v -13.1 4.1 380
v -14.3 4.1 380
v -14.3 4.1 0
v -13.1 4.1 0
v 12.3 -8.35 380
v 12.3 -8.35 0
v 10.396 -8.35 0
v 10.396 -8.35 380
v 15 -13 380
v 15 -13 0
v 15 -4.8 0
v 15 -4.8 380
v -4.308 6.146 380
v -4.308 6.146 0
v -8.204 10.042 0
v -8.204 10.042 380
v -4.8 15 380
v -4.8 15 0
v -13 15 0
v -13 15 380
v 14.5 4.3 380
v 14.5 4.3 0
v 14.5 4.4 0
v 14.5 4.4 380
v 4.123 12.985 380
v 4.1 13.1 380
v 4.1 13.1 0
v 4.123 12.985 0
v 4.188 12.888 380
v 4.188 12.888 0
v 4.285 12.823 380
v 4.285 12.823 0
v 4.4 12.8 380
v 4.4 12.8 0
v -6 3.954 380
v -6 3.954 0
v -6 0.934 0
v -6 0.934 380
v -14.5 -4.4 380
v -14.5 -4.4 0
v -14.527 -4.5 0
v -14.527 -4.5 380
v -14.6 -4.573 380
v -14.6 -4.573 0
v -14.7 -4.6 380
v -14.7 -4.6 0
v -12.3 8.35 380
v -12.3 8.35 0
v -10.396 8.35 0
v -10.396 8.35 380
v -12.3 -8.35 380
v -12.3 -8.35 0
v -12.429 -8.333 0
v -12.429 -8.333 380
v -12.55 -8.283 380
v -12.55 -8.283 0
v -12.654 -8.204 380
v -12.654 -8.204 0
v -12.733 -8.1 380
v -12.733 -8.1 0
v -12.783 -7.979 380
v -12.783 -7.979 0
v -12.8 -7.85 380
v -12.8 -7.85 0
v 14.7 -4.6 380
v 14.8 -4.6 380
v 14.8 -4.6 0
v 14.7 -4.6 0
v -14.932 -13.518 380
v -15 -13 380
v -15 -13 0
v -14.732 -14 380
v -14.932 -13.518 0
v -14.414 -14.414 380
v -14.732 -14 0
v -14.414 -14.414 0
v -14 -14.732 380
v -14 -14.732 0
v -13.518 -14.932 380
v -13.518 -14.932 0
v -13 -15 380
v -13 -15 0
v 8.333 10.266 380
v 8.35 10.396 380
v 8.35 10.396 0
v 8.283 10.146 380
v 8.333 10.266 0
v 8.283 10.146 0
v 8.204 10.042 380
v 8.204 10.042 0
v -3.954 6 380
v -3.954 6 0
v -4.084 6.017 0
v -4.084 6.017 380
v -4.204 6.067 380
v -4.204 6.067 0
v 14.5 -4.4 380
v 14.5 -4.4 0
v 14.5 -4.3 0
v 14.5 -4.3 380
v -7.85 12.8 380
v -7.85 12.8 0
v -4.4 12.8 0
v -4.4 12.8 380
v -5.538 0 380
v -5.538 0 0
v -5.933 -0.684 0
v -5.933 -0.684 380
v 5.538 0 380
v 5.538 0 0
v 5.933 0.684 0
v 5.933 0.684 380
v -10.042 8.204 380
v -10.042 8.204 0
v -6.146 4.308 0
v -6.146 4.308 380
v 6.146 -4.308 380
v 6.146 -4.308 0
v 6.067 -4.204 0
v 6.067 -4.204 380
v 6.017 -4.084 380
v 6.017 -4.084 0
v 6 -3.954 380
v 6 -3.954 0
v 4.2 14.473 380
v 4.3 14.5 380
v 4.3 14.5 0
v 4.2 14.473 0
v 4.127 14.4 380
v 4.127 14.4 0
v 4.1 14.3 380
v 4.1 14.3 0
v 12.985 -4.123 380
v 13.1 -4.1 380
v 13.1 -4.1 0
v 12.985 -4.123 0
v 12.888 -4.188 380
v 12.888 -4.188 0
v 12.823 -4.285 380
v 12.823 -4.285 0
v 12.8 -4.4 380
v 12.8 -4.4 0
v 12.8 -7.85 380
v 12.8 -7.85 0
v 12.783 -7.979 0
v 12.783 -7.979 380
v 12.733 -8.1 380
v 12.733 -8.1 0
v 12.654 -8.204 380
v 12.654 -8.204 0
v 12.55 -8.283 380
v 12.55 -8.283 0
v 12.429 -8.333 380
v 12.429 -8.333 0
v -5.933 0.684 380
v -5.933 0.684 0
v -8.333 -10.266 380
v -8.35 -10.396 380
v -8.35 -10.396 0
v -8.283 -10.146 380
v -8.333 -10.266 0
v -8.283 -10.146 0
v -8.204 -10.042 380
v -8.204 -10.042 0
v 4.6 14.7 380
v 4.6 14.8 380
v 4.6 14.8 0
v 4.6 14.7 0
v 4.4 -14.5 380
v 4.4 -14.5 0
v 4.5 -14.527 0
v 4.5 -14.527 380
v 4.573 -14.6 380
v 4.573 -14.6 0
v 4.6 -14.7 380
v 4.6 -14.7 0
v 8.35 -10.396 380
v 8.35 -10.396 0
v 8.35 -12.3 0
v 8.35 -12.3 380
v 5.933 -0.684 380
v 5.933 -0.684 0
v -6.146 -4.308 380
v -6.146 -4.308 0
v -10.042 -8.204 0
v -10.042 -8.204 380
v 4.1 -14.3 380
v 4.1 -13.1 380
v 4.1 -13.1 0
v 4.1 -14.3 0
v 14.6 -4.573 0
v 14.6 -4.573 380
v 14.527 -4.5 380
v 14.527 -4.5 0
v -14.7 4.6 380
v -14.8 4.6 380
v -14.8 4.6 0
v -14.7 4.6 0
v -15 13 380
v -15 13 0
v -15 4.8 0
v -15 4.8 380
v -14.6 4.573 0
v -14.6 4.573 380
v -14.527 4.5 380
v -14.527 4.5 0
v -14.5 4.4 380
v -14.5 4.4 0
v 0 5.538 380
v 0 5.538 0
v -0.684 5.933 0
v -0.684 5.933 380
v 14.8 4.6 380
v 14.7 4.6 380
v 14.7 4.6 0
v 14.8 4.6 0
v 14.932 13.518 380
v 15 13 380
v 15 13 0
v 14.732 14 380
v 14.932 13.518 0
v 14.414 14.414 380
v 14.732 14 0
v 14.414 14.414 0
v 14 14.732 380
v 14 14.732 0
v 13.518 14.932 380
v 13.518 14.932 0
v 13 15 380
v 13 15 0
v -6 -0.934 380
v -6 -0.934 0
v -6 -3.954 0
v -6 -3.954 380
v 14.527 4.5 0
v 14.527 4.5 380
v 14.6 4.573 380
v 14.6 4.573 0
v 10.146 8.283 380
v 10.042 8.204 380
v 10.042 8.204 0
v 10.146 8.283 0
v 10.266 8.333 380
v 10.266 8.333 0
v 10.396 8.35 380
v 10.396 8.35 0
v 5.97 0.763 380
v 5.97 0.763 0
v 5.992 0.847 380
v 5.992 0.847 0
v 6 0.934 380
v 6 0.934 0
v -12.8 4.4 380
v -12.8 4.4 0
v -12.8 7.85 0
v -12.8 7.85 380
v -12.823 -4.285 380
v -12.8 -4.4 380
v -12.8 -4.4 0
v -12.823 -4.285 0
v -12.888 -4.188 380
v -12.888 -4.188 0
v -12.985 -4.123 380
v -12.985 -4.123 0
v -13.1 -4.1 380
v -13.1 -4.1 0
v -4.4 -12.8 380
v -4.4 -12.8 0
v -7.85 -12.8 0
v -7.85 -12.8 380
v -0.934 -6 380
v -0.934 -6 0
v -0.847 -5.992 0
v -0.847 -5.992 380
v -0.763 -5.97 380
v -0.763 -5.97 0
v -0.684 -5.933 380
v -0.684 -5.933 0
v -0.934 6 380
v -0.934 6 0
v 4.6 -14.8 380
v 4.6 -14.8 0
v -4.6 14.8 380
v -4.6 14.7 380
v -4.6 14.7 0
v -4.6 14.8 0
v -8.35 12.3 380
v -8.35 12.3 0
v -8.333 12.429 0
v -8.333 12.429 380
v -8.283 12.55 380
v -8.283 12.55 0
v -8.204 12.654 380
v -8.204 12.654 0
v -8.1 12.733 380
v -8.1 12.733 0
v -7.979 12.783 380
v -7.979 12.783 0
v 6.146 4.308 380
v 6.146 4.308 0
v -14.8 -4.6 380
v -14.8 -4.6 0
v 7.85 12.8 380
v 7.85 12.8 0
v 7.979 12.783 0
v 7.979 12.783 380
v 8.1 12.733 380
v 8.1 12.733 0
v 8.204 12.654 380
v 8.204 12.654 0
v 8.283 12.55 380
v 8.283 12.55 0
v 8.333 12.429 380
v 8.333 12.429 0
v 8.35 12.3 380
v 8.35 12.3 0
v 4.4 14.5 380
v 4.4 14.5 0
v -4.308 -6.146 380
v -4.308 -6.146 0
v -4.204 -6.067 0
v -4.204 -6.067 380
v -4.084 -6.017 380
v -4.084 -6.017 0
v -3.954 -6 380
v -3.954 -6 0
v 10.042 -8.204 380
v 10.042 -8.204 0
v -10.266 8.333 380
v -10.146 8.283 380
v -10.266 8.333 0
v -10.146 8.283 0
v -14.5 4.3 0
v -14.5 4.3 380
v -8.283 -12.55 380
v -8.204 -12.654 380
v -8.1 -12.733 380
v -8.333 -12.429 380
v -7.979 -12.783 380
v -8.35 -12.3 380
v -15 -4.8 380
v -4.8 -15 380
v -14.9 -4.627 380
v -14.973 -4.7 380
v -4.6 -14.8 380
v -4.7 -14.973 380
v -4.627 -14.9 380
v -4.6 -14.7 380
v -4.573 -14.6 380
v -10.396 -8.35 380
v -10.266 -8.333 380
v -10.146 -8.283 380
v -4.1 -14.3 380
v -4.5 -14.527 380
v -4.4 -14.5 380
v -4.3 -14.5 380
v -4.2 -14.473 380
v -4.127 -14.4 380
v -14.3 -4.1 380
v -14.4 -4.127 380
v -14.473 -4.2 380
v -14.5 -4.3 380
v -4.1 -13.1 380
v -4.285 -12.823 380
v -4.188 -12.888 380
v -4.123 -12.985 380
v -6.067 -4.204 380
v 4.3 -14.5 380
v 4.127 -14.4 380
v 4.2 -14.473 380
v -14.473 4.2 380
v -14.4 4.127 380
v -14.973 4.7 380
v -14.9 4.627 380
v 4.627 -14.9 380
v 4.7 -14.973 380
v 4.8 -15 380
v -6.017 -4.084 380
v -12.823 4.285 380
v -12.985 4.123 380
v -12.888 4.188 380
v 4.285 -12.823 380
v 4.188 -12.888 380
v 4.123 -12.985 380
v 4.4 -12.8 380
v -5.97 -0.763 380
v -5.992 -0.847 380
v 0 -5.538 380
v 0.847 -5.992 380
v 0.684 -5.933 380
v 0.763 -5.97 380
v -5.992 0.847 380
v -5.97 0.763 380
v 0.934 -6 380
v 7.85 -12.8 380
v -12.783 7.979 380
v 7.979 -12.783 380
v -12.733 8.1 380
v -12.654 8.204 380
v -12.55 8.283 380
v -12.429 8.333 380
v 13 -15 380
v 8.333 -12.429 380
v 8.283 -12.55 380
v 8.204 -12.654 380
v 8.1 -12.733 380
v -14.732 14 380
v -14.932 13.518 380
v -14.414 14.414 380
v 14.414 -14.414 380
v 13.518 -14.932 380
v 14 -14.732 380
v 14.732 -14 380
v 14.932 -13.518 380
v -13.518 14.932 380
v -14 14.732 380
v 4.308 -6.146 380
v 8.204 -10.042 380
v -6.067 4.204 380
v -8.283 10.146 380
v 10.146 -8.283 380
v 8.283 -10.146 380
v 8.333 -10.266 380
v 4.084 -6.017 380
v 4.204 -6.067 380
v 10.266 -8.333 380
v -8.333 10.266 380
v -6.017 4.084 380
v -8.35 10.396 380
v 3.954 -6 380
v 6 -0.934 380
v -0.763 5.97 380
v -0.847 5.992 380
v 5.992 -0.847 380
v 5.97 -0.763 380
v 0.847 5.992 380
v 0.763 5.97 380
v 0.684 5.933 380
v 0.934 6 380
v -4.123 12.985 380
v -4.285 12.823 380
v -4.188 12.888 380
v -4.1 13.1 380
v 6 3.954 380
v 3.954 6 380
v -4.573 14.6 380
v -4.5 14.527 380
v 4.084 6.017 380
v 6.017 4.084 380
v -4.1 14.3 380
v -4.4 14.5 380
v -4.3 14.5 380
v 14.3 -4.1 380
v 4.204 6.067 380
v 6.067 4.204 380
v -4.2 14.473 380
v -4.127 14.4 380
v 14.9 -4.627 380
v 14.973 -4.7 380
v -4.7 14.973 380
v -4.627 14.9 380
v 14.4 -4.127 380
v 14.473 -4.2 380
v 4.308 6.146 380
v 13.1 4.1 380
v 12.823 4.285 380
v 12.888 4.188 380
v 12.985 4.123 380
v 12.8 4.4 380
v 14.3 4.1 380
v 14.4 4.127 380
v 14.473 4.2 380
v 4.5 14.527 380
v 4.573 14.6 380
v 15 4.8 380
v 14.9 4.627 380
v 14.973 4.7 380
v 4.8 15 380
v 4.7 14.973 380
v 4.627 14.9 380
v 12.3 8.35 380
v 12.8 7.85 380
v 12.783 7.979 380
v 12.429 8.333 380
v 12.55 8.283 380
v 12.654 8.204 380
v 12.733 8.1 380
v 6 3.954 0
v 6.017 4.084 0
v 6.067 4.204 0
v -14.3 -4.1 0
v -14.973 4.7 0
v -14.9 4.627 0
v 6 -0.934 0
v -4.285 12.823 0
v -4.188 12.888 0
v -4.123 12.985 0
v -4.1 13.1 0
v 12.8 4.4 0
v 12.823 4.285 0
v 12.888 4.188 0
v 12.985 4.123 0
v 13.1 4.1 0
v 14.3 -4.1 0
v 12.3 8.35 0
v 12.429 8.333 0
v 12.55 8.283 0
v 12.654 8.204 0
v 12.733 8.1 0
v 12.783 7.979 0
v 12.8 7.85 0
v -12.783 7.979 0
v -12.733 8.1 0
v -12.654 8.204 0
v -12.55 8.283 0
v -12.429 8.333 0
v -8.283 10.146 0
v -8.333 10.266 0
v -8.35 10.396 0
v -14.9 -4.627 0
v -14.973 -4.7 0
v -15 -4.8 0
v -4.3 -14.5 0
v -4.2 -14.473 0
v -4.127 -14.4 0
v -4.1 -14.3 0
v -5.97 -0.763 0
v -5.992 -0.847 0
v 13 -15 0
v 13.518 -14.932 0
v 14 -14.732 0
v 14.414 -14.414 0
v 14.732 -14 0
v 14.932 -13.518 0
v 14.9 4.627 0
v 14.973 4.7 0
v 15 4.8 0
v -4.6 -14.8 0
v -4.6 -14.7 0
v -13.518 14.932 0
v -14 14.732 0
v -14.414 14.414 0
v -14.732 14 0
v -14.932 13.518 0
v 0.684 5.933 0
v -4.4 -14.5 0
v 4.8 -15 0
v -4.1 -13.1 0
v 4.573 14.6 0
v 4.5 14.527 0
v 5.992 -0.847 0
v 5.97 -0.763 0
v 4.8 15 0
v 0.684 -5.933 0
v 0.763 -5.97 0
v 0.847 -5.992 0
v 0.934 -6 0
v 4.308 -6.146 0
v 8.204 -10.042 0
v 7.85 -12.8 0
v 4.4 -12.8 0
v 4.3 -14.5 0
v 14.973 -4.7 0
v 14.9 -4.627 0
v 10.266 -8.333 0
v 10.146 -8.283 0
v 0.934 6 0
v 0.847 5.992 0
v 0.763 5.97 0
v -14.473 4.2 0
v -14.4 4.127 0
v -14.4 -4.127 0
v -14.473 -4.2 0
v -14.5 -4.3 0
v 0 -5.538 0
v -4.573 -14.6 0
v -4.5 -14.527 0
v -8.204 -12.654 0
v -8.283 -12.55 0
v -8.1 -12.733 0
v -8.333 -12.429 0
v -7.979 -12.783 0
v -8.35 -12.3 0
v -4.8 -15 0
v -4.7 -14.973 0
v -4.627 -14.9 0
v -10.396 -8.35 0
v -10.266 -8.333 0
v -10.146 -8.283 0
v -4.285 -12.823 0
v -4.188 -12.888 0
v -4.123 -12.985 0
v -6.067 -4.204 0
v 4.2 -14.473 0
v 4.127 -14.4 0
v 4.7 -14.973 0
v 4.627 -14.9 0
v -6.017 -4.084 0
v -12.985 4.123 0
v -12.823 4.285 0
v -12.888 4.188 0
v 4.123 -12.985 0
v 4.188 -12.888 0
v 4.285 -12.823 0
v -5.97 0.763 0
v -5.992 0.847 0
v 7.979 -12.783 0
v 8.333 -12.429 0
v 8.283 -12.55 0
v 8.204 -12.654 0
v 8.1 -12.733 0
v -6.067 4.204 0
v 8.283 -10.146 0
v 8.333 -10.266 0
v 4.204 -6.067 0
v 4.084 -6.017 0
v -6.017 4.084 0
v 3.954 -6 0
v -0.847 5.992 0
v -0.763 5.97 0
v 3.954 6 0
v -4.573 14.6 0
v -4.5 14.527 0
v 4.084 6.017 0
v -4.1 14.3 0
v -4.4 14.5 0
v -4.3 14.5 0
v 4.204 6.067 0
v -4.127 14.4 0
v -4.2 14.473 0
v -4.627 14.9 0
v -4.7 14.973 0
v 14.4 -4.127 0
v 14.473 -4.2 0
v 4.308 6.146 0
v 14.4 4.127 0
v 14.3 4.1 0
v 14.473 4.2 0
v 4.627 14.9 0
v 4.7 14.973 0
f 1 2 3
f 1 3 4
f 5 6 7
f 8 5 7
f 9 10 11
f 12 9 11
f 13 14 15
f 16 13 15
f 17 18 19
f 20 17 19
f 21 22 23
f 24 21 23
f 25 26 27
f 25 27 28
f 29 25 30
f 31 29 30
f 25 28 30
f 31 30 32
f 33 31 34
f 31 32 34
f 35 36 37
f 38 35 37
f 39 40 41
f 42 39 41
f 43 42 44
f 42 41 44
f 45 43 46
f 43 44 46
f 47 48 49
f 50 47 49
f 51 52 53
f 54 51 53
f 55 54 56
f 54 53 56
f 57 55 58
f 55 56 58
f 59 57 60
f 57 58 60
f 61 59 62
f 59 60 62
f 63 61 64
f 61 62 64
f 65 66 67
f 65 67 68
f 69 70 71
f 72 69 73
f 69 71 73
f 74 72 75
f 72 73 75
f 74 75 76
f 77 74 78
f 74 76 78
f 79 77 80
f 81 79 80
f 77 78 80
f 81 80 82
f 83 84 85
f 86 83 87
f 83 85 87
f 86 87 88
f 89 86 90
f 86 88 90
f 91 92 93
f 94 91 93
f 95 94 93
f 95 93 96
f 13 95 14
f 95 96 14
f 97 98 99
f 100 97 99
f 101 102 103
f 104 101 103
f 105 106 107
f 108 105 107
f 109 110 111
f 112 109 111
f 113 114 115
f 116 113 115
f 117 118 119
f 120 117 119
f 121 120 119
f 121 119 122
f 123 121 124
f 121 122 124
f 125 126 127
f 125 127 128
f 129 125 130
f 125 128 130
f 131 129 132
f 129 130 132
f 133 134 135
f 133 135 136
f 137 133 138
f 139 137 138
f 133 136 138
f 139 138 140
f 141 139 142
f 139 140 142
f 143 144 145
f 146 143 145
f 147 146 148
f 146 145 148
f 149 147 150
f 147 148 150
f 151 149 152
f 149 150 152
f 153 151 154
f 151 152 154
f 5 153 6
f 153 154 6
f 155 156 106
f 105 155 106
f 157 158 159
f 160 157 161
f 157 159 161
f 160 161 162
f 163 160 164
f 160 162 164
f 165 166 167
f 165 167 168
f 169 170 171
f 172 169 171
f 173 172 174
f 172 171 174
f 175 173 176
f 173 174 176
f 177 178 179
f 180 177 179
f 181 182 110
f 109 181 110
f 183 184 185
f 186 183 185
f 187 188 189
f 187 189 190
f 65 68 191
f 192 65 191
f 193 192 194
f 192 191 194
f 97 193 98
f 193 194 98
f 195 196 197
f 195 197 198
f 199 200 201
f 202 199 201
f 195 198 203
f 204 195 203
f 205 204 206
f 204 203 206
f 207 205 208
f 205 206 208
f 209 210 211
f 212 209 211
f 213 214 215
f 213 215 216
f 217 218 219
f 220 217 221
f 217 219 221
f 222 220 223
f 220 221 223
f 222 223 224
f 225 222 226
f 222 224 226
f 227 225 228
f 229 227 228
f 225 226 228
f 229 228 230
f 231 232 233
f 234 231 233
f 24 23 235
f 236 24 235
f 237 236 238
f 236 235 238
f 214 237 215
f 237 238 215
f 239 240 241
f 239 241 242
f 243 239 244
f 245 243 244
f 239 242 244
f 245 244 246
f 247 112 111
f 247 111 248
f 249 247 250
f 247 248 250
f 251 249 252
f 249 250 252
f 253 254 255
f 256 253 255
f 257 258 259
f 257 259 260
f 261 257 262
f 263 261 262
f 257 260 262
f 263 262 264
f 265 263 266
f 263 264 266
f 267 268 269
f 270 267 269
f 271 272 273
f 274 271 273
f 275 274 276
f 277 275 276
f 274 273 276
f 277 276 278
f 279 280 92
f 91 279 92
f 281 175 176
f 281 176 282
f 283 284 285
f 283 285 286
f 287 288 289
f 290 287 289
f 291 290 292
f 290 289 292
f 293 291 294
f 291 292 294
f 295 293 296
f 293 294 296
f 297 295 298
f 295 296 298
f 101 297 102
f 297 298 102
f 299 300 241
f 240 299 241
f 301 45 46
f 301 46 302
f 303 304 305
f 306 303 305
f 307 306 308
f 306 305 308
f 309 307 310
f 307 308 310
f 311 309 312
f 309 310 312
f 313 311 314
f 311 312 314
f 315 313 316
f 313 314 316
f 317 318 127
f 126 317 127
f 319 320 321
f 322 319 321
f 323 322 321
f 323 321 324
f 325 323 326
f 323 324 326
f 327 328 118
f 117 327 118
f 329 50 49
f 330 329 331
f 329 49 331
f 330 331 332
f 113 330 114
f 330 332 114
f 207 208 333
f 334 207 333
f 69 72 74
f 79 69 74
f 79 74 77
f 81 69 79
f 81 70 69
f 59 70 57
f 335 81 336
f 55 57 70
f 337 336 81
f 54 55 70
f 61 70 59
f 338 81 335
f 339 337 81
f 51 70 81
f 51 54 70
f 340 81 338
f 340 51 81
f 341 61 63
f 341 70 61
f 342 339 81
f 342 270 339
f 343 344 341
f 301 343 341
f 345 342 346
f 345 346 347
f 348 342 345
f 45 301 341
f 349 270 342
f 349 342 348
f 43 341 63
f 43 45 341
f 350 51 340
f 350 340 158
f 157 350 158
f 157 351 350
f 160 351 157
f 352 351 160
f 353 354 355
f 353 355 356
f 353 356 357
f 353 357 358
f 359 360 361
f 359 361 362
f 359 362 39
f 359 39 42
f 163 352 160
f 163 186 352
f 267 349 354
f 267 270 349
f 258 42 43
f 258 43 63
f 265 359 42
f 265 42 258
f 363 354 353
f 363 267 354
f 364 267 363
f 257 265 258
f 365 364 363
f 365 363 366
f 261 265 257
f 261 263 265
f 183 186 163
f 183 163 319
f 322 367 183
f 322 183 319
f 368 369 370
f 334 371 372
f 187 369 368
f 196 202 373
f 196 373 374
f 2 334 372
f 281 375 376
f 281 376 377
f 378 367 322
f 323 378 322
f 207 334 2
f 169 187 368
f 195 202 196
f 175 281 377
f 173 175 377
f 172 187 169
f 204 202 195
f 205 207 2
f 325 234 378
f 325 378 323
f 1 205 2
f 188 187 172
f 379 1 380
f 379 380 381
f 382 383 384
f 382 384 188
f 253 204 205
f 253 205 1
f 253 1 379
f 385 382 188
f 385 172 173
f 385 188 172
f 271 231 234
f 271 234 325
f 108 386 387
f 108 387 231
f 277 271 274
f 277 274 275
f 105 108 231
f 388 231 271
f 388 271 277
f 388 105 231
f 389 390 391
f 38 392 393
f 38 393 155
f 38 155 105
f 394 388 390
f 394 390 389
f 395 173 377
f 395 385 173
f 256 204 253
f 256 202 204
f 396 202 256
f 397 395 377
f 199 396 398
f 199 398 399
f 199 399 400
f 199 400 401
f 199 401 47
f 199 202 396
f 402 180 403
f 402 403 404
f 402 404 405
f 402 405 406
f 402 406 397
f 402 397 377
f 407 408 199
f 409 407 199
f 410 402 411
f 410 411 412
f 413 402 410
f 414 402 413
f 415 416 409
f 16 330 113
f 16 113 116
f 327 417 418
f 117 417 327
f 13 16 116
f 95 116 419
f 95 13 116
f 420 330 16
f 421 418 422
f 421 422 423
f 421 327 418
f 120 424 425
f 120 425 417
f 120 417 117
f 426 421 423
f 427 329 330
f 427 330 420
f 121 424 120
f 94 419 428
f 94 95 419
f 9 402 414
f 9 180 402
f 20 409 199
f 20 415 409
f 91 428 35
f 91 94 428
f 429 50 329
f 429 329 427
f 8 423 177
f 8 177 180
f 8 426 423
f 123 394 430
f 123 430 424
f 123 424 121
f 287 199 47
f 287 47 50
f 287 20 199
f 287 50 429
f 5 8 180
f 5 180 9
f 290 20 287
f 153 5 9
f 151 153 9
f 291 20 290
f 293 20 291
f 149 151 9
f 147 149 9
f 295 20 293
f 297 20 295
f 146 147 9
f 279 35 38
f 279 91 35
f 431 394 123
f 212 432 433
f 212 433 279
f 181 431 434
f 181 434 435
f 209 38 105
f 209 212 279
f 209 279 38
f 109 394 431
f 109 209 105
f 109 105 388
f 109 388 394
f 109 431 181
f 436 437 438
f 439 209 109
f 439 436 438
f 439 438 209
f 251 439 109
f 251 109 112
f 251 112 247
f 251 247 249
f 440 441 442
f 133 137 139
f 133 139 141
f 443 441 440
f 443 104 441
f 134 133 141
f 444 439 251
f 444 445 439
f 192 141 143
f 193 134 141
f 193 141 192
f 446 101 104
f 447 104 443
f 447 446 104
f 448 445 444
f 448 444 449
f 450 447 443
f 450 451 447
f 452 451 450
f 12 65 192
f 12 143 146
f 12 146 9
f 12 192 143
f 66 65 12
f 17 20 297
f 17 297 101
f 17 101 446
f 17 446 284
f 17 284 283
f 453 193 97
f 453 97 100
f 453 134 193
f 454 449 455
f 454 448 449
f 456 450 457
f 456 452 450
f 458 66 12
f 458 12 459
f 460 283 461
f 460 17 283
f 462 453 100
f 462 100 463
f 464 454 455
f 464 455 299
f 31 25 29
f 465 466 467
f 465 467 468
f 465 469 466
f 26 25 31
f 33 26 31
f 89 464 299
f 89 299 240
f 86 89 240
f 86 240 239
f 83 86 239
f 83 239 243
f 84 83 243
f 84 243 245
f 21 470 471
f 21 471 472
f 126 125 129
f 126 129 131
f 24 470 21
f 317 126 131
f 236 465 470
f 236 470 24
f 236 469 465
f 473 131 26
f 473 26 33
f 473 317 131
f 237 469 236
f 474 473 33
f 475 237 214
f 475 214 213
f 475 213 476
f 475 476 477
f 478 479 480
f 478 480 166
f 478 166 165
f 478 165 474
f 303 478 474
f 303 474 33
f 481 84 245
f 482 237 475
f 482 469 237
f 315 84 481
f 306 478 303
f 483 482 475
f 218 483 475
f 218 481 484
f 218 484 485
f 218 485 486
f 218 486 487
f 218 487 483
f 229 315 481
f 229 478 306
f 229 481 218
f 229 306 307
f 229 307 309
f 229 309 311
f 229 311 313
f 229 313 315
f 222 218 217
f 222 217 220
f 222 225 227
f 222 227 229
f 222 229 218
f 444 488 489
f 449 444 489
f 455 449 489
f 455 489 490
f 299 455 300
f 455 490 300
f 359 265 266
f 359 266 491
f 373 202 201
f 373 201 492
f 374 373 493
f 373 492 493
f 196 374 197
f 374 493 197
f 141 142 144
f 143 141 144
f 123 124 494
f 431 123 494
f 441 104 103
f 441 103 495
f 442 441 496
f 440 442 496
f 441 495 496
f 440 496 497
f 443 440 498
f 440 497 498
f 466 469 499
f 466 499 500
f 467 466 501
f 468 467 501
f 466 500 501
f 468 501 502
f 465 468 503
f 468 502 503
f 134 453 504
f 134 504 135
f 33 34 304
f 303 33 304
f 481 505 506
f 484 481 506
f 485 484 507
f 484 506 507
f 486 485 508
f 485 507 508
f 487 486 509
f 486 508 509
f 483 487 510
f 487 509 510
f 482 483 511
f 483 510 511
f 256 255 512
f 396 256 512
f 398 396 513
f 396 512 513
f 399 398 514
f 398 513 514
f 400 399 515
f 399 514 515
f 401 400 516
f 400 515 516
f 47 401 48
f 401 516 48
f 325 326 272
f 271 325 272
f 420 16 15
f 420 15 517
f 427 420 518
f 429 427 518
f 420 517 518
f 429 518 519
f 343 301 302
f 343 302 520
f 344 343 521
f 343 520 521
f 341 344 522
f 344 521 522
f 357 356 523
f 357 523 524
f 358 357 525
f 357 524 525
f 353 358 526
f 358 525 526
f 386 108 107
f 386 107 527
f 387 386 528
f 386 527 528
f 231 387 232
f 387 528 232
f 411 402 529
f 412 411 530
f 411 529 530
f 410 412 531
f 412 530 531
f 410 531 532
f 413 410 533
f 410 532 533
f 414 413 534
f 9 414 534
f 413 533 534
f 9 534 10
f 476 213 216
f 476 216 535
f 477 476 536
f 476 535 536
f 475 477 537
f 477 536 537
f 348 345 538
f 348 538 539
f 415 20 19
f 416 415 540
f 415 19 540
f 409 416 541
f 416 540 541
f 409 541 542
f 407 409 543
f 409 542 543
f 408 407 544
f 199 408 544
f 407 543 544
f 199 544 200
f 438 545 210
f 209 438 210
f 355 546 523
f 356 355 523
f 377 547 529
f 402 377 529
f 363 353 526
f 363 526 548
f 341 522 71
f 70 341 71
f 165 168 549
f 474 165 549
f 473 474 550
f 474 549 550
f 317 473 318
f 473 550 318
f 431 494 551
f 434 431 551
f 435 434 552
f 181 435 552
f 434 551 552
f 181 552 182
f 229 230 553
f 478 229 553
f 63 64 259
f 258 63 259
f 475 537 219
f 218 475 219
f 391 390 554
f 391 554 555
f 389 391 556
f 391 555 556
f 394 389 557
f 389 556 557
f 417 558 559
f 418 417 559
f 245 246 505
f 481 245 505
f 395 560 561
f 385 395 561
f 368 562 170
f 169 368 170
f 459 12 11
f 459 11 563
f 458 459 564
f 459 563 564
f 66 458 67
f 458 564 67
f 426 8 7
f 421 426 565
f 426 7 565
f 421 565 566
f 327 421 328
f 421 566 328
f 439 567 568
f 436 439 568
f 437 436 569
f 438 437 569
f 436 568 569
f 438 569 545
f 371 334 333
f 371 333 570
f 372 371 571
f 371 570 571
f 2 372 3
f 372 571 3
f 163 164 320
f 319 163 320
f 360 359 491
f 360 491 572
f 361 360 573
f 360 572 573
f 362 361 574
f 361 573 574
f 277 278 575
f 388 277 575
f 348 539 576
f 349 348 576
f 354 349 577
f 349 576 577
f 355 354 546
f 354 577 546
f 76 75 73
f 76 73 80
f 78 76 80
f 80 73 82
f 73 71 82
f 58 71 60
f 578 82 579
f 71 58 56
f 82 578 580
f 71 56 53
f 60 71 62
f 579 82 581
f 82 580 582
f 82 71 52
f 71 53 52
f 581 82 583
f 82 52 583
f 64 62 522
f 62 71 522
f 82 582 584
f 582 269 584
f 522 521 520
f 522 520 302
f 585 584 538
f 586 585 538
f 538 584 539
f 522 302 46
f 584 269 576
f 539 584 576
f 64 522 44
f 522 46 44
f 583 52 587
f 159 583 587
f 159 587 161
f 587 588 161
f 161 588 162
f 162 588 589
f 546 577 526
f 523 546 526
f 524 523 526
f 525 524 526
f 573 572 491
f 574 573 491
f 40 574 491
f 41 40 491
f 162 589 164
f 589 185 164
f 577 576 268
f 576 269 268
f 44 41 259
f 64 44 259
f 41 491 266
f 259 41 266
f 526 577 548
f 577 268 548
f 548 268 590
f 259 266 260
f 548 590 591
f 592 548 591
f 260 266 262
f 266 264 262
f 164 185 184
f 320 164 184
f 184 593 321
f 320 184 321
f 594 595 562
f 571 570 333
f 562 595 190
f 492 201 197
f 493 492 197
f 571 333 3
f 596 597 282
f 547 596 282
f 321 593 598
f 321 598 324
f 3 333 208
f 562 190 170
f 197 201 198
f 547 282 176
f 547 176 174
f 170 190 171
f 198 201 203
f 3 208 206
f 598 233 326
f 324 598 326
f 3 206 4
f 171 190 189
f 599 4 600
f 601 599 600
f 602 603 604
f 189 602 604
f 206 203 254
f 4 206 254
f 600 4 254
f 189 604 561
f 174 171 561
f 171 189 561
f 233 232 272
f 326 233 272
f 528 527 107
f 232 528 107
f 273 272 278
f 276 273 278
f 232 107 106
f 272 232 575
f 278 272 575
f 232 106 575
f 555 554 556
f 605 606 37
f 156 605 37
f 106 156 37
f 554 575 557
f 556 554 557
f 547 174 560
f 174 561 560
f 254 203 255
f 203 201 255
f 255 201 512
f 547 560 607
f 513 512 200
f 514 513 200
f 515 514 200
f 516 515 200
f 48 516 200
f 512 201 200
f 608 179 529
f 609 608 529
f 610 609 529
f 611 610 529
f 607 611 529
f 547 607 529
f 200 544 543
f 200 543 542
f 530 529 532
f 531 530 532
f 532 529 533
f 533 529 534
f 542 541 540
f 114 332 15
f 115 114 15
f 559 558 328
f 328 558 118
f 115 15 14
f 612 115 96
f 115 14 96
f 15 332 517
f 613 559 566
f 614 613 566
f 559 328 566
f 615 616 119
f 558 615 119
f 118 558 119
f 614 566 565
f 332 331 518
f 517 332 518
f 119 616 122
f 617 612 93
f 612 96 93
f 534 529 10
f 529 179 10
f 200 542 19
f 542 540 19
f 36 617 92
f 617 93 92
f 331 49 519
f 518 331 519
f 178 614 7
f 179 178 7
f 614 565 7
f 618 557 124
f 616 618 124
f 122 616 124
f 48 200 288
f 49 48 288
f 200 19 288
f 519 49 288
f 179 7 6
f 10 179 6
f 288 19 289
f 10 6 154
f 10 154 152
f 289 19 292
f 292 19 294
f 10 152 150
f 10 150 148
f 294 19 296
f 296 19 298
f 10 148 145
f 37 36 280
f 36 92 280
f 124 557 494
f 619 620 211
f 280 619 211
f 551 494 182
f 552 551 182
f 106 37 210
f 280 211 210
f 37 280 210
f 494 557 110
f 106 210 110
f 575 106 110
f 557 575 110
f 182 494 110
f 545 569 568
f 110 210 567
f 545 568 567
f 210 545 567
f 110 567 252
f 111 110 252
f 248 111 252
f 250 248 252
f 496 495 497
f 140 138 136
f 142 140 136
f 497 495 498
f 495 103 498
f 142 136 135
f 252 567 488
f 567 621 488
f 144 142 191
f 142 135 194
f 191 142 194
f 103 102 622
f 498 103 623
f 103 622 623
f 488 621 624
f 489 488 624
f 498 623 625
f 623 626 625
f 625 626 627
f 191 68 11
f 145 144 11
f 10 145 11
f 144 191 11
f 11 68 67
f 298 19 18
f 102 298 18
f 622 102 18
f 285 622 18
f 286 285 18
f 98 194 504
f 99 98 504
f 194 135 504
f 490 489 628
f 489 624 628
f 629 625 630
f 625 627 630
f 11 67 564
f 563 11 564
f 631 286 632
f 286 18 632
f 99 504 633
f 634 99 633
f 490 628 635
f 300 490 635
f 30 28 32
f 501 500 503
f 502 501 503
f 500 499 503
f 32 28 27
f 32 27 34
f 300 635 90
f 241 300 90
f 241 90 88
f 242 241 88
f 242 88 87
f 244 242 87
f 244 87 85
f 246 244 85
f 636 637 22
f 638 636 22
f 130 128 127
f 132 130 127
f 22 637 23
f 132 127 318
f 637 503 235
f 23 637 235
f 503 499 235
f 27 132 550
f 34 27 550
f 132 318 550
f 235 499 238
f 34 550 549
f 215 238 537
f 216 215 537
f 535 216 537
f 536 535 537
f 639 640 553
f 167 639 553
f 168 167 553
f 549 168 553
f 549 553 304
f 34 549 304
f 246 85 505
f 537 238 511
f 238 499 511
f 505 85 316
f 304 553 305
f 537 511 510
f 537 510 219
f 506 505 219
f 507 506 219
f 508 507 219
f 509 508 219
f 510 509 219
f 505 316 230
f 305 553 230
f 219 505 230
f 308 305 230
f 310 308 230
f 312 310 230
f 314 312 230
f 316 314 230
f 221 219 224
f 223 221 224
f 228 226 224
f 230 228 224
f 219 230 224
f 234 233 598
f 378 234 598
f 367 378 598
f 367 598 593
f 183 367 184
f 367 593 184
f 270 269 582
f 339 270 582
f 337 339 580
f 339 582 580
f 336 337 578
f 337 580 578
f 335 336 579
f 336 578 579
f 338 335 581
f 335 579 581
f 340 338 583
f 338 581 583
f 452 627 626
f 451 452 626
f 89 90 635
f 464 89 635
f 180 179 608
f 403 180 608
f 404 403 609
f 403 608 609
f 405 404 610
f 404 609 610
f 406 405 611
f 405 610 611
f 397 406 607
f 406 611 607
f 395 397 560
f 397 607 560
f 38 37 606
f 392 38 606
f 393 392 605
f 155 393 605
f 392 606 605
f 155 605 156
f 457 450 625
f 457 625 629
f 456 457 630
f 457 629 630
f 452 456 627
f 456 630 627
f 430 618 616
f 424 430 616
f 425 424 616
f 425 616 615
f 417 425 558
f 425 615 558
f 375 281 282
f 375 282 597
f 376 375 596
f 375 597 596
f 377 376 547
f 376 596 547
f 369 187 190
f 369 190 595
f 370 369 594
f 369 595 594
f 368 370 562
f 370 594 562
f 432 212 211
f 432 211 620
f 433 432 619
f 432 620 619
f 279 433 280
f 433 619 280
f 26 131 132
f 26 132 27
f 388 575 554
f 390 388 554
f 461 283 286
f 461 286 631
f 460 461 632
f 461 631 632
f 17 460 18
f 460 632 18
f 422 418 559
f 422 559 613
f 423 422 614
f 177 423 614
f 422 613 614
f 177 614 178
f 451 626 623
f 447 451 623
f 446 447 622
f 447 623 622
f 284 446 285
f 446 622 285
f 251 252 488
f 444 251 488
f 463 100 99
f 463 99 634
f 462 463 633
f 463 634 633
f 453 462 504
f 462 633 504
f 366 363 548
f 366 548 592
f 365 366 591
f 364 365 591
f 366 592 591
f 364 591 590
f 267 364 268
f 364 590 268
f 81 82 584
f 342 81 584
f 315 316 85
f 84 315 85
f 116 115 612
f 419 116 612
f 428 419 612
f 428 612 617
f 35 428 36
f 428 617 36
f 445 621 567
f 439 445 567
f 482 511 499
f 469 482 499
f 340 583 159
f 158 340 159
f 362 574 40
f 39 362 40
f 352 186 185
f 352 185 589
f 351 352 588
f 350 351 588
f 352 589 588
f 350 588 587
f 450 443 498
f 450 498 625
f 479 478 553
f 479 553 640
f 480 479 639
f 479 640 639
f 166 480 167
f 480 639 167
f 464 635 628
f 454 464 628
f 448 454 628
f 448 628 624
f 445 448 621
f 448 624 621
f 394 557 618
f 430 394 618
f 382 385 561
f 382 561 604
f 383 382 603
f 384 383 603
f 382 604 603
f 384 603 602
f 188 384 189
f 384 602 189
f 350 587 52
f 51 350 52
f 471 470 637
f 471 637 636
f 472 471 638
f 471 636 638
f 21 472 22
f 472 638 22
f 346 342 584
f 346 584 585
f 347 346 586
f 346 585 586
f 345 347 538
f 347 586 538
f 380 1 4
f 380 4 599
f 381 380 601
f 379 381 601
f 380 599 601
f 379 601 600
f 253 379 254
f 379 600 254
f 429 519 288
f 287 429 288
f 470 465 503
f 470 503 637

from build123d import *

# Parameters (mm, degrees)
BOSS_EXTRUDE1_DEPTH = 380


with BuildPart() as part:
    # Sketch1 → Boss-Extrude1 (new body)
    with BuildSketch(Plane.XY):
        with BuildLine():
            Line((-12.8, 4.4), (-12.8, 7.85))
            ThreePointArc((-12.8, 7.85), (-12.653553391, 8.203553391), (-12.3, 8.35))
            Line((-12.3, 8.35), (-10.395584412, 8.35))
            ThreePointArc((-10.395584412, 8.35), (-10.204242696, 8.311939766), (-10.042031022, 8.203553391))
            Line((-10.042031022, 8.203553391), (-6.146446609, 4.307968978))
            ThreePointArc((-6.146446609, 4.307968978), (-6.038060234, 4.145757304), (-6, 3.954415588))
            Line((-6, 3.954415588), (-6, 0.933974596))
            ThreePointArc((-6, 0.933974596), (-5.982962913, 0.804565074), (-5.933012702, 0.683974596))
            Line((-5.933012702, 0.683974596), (-5.538119785, 0))
            Line((-5.538119785, 0), (-5.933012702, -0.683974596))
            ThreePointArc((-5.933012702, -0.683974596), (-5.982962913, -0.804565074), (-6, -0.933974596))
            Line((-6, -0.933974596), (-6, -3.954415588))
            ThreePointArc((-6, -3.954415588), (-6.038060234, -4.145757304), (-6.146446609, -4.307968978))
            Line((-6.146446609, -4.307968978), (-10.042031022, -8.203553391))
            ThreePointArc((-10.042031022, -8.203553391), (-10.204242696, -8.311939766), (-10.395584412, -8.35))
            Line((-10.395584412, -8.35), (-12.3, -8.35))
            ThreePointArc((-12.3, -8.35), (-12.653553391, -8.203553391), (-12.8, -7.85))
            Line((-12.8, -7.85), (-12.8, -4.4))
            ThreePointArc((-12.8, -4.4), (-12.887867966, -4.187867966), (-13.1, -4.1))
            Line((-13.1, -4.1), (-14.3, -4.1))
            ThreePointArc((-14.3, -4.1), (-14.441421356, -4.158578644), (-14.5, -4.3))
            Line((-14.5, -4.3), (-14.5, -4.4))
            ThreePointArc((-14.5, -4.4), (-14.558578644, -4.541421356), (-14.7, -4.6))
            Line((-14.7, -4.6), (-14.8, -4.6))
            ThreePointArc((-14.8, -4.6), (-14.941421356, -4.658578644), (-15, -4.8))
            Line((-15, -4.8), (-15, -13))
            ThreePointArc((-15, -13), (-14.414213562, -14.414213562), (-13, -15))
            Line((-13, -15), (-4.8, -15))
            ThreePointArc((-4.8, -15), (-4.658578644, -14.941421356), (-4.6, -14.8))
            Line((-4.6, -14.8), (-4.6, -14.7))
            ThreePointArc((-4.6, -14.7), (-4.541421356, -14.558578644), (-4.4, -14.5))
            Line((-4.4, -14.5), (-4.3, -14.5))
            ThreePointArc((-4.3, -14.5), (-4.158578644, -14.441421356), (-4.1, -14.3))
            Line((-4.1, -14.3), (-4.1, -13.1))
            ThreePointArc((-4.1, -13.1), (-4.187867966, -12.887867966), (-4.4, -12.8))
            Line((-4.4, -12.8), (-7.85, -12.8))
            ThreePointArc((-7.85, -12.8), (-8.203553391, -12.653553391), (-8.35, -12.3))
            Line((-8.35, -12.3), (-8.35, -10.395584412))
            ThreePointArc((-8.35, -10.395584412), (-8.311939766, -10.204242696), (-8.203553391, -10.042031022))
            Line((-8.203553391, -10.042031022), (-4.307968978, -6.146446609))
            ThreePointArc((-4.307968978, -6.146446609), (-4.145757304, -6.038060234), (-3.954415588, -6))
            Line((-3.954415588, -6), (-0.933974596, -6))
            ThreePointArc((-0.933974596, -6), (-0.804565074, -5.982962913), (-0.683974596, -5.933012702))
            Line((-0.683974596, -5.933012702), (0, -5.538119785))
            Line((0, -5.538119785), (0.683974596, -5.933012702))
            ThreePointArc((0.683974596, -5.933012702), (0.804565074, -5.982962913), (0.933974596, -6))
            Line((0.933974596, -6), (3.954415588, -6))
            ThreePointArc((3.954415588, -6), (4.145757304, -6.038060234), (4.307968978, -6.146446609))
            Line((4.307968978, -6.146446609), (8.203553391, -10.042031022))
            ThreePointArc((8.203553391, -10.042031022), (8.311939766, -10.204242696), (8.35, -10.395584412))
            Line((8.35, -10.395584412), (8.35, -12.3))
            ThreePointArc((8.35, -12.3), (8.203553391, -12.653553391), (7.85, -12.8))
            Line((7.85, -12.8), (4.4, -12.8))
            ThreePointArc((4.4, -12.8), (4.187867966, -12.887867966), (4.1, -13.1))
            Line((4.1, -13.1), (4.1, -14.3))
            ThreePointArc((4.1, -14.3), (4.158578644, -14.441421356), (4.3, -14.5))
            Line((4.3, -14.5), (4.4, -14.5))
            ThreePointArc((4.4, -14.5), (4.541421356, -14.558578644), (4.6, -14.7))
            Line((4.6, -14.7), (4.6, -14.8))
            ThreePointArc((4.6, -14.8), (4.658578644, -14.941421356), (4.8, -15))
            Line((4.8, -15), (13, -15))
            ThreePointArc((13, -15), (14.414213562, -14.414213562), (15, -13))
            Line((15, -13), (15, -4.8))
            ThreePointArc((15, -4.8), (14.941421356, -4.658578644), (14.8, -4.6))
            Line((14.8, -4.6), (14.7, -4.6))
            ThreePointArc((14.7, -4.6), (14.558578644, -4.541421356), (14.5, -4.4))
            Line((14.5, -4.4), (14.5, -4.3))
            ThreePointArc((14.5, -4.3), (14.441421356, -4.158578644), (14.3, -4.1))
            Line((14.3, -4.1), (13.1, -4.1))
            ThreePointArc((13.1, -4.1), (12.887867966, -4.187867966), (12.8, -4.4))
            Line((12.8, -4.4), (12.8, -7.85))
            ThreePointArc((12.8, -7.85), (12.653553391, -8.203553391), (12.3, -8.35))
            Line((12.3, -8.35), (10.395584412, -8.35))
            ThreePointArc((10.395584412, -8.35), (10.204242696, -8.311939766), (10.042031022, -8.203553391))
            Line((10.042031022, -8.203553391), (6.146446609, -4.307968978))
            ThreePointArc((6.146446609, -4.307968978), (6.038060234, -4.145757304), (6, -3.954415588))
            Line((6, -3.954415588), (6, -0.933974596))
            ThreePointArc((6, -0.933974596), (5.982962913, -0.804565074), (5.933012702, -0.683974596))
            Line((5.933012702, -0.683974596), (5.538119785, 0))
            Line((5.538119785, 0), (5.933012702, 0.683974596))
            ThreePointArc((5.933012702, 0.683974596), (5.982962913, 0.804565074), (6, 0.933974596))
            Line((6, 0.933974596), (6, 3.954415588))
            ThreePointArc((6, 3.954415588), (6.038060234, 4.145757304), (6.146446609, 4.307968978))
            Line((6.146446609, 4.307968978), (10.042031022, 8.203553391))
            ThreePointArc((10.042031022, 8.203553391), (10.204242696, 8.311939766), (10.395584412, 8.35))
            Line((10.395584412, 8.35), (12.3, 8.35))
            ThreePointArc((12.3, 8.35), (12.653553391, 8.203553391), (12.8, 7.85))
            Line((12.8, 7.85), (12.8, 4.4))
            ThreePointArc((12.8, 4.4), (12.887867966, 4.187867966), (13.1, 4.1))
            Line((13.1, 4.1), (14.3, 4.1))
            ThreePointArc((14.3, 4.1), (14.441421356, 4.158578644), (14.5, 4.3))
            Line((14.5, 4.3), (14.5, 4.4))
            ThreePointArc((14.5, 4.4), (14.558578644, 4.541421356), (14.7, 4.6))
            Line((14.7, 4.6), (14.8, 4.6))
            ThreePointArc((14.8, 4.6), (14.941421356, 4.658578644), (15, 4.8))
            Line((15, 4.8), (15, 13))
            ThreePointArc((15, 13), (14.414213562, 14.414213562), (13, 15))
            Line((13, 15), (4.8, 15))
            ThreePointArc((4.8, 15), (4.658578644, 14.941421356), (4.6, 14.8))
            Line((4.6, 14.8), (4.6, 14.7))
            ThreePointArc((4.6, 14.7), (4.541421356, 14.558578644), (4.4, 14.5))
            Line((4.4, 14.5), (4.3, 14.5))
            ThreePointArc((4.3, 14.5), (4.158578644, 14.441421356), (4.1, 14.3))
            Line((4.1, 14.3), (4.1, 13.1))
            ThreePointArc((4.1, 13.1), (4.187867966, 12.887867966), (4.4, 12.8))
            Line((4.4, 12.8), (7.85, 12.8))
            ThreePointArc((7.85, 12.8), (8.203553391, 12.653553391), (8.35, 12.3))
            Line((8.35, 12.3), (8.35, 10.395584412))
            ThreePointArc((8.35, 10.395584412), (8.311939766, 10.204242696), (8.203553391, 10.042031022))
            Line((8.203553391, 10.042031022), (4.307968978, 6.146446609))
            ThreePointArc((4.307968978, 6.146446609), (4.145757304, 6.038060234), (3.954415588, 6))
            Line((3.954415588, 6), (0.933974596, 6))
            ThreePointArc((0.933974596, 6), (0.804565074, 5.982962913), (0.683974596, 5.933012702))
            Line((0.683974596, 5.933012702), (0, 5.538119785))
            Line((0, 5.538119785), (-0.683974596, 5.933012702))
            ThreePointArc((-0.683974596, 5.933012702), (-0.804565074, 5.982962913), (-0.933974596, 6))
            Line((-0.933974596, 6), (-3.954415588, 6))
            ThreePointArc((-3.954415588, 6), (-4.145757304, 6.038060234), (-4.307968978, 6.146446609))
            Line((-4.307968978, 6.146446609), (-8.203553391, 10.042031022))
            ThreePointArc((-8.203553391, 10.042031022), (-8.311939766, 10.204242696), (-8.35, 10.395584412))
            Line((-8.35, 10.395584412), (-8.35, 12.3))
            ThreePointArc((-8.35, 12.3), (-8.203553391, 12.653553391), (-7.85, 12.8))
            Line((-7.85, 12.8), (-4.4, 12.8))
            ThreePointArc((-4.4, 12.8), (-4.187867966, 12.887867966), (-4.1, 13.1))
            Line((-4.1, 13.1), (-4.1, 14.3))
            ThreePointArc((-4.1, 14.3), (-4.158578644, 14.441421356), (-4.3, 14.5))
            Line((-4.3, 14.5), (-4.4, 14.5))
            ThreePointArc((-4.4, 14.5), (-4.541421356, 14.558578644), (-4.6, 14.7))
            Line((-4.6, 14.7), (-4.6, 14.8))
            ThreePointArc((-4.6, 14.8), (-4.658578644, 14.941421356), (-4.8, 15))
            Line((-4.8, 15), (-13, 15))
            ThreePointArc((-13, 15), (-14.414213562, 14.414213562), (-15, 13))
            Line((-15, 13), (-15, 4.8))
            ThreePointArc((-15, 4.8), (-14.941421356, 4.658578644), (-14.8, 4.6))
            Line((-14.8, 4.6), (-14.7, 4.6))
            ThreePointArc((-14.7, 4.6), (-14.558578644, 4.541421356), (-14.5, 4.4))
            Line((-14.5, 4.4), (-14.5, 4.3))
            ThreePointArc((-14.5, 4.3), (-14.441421356, 4.158578644), (-14.3, 4.1))
            Line((-14.3, 4.1), (-13.1, 4.1))
            ThreePointArc((-13.1, 4.1), (-12.887867966, 4.187867966), (-12.8, 4.4))
        make_face()
    extrude(amount=BOSS_EXTRUDE1_DEPTH)


solid = part.part
